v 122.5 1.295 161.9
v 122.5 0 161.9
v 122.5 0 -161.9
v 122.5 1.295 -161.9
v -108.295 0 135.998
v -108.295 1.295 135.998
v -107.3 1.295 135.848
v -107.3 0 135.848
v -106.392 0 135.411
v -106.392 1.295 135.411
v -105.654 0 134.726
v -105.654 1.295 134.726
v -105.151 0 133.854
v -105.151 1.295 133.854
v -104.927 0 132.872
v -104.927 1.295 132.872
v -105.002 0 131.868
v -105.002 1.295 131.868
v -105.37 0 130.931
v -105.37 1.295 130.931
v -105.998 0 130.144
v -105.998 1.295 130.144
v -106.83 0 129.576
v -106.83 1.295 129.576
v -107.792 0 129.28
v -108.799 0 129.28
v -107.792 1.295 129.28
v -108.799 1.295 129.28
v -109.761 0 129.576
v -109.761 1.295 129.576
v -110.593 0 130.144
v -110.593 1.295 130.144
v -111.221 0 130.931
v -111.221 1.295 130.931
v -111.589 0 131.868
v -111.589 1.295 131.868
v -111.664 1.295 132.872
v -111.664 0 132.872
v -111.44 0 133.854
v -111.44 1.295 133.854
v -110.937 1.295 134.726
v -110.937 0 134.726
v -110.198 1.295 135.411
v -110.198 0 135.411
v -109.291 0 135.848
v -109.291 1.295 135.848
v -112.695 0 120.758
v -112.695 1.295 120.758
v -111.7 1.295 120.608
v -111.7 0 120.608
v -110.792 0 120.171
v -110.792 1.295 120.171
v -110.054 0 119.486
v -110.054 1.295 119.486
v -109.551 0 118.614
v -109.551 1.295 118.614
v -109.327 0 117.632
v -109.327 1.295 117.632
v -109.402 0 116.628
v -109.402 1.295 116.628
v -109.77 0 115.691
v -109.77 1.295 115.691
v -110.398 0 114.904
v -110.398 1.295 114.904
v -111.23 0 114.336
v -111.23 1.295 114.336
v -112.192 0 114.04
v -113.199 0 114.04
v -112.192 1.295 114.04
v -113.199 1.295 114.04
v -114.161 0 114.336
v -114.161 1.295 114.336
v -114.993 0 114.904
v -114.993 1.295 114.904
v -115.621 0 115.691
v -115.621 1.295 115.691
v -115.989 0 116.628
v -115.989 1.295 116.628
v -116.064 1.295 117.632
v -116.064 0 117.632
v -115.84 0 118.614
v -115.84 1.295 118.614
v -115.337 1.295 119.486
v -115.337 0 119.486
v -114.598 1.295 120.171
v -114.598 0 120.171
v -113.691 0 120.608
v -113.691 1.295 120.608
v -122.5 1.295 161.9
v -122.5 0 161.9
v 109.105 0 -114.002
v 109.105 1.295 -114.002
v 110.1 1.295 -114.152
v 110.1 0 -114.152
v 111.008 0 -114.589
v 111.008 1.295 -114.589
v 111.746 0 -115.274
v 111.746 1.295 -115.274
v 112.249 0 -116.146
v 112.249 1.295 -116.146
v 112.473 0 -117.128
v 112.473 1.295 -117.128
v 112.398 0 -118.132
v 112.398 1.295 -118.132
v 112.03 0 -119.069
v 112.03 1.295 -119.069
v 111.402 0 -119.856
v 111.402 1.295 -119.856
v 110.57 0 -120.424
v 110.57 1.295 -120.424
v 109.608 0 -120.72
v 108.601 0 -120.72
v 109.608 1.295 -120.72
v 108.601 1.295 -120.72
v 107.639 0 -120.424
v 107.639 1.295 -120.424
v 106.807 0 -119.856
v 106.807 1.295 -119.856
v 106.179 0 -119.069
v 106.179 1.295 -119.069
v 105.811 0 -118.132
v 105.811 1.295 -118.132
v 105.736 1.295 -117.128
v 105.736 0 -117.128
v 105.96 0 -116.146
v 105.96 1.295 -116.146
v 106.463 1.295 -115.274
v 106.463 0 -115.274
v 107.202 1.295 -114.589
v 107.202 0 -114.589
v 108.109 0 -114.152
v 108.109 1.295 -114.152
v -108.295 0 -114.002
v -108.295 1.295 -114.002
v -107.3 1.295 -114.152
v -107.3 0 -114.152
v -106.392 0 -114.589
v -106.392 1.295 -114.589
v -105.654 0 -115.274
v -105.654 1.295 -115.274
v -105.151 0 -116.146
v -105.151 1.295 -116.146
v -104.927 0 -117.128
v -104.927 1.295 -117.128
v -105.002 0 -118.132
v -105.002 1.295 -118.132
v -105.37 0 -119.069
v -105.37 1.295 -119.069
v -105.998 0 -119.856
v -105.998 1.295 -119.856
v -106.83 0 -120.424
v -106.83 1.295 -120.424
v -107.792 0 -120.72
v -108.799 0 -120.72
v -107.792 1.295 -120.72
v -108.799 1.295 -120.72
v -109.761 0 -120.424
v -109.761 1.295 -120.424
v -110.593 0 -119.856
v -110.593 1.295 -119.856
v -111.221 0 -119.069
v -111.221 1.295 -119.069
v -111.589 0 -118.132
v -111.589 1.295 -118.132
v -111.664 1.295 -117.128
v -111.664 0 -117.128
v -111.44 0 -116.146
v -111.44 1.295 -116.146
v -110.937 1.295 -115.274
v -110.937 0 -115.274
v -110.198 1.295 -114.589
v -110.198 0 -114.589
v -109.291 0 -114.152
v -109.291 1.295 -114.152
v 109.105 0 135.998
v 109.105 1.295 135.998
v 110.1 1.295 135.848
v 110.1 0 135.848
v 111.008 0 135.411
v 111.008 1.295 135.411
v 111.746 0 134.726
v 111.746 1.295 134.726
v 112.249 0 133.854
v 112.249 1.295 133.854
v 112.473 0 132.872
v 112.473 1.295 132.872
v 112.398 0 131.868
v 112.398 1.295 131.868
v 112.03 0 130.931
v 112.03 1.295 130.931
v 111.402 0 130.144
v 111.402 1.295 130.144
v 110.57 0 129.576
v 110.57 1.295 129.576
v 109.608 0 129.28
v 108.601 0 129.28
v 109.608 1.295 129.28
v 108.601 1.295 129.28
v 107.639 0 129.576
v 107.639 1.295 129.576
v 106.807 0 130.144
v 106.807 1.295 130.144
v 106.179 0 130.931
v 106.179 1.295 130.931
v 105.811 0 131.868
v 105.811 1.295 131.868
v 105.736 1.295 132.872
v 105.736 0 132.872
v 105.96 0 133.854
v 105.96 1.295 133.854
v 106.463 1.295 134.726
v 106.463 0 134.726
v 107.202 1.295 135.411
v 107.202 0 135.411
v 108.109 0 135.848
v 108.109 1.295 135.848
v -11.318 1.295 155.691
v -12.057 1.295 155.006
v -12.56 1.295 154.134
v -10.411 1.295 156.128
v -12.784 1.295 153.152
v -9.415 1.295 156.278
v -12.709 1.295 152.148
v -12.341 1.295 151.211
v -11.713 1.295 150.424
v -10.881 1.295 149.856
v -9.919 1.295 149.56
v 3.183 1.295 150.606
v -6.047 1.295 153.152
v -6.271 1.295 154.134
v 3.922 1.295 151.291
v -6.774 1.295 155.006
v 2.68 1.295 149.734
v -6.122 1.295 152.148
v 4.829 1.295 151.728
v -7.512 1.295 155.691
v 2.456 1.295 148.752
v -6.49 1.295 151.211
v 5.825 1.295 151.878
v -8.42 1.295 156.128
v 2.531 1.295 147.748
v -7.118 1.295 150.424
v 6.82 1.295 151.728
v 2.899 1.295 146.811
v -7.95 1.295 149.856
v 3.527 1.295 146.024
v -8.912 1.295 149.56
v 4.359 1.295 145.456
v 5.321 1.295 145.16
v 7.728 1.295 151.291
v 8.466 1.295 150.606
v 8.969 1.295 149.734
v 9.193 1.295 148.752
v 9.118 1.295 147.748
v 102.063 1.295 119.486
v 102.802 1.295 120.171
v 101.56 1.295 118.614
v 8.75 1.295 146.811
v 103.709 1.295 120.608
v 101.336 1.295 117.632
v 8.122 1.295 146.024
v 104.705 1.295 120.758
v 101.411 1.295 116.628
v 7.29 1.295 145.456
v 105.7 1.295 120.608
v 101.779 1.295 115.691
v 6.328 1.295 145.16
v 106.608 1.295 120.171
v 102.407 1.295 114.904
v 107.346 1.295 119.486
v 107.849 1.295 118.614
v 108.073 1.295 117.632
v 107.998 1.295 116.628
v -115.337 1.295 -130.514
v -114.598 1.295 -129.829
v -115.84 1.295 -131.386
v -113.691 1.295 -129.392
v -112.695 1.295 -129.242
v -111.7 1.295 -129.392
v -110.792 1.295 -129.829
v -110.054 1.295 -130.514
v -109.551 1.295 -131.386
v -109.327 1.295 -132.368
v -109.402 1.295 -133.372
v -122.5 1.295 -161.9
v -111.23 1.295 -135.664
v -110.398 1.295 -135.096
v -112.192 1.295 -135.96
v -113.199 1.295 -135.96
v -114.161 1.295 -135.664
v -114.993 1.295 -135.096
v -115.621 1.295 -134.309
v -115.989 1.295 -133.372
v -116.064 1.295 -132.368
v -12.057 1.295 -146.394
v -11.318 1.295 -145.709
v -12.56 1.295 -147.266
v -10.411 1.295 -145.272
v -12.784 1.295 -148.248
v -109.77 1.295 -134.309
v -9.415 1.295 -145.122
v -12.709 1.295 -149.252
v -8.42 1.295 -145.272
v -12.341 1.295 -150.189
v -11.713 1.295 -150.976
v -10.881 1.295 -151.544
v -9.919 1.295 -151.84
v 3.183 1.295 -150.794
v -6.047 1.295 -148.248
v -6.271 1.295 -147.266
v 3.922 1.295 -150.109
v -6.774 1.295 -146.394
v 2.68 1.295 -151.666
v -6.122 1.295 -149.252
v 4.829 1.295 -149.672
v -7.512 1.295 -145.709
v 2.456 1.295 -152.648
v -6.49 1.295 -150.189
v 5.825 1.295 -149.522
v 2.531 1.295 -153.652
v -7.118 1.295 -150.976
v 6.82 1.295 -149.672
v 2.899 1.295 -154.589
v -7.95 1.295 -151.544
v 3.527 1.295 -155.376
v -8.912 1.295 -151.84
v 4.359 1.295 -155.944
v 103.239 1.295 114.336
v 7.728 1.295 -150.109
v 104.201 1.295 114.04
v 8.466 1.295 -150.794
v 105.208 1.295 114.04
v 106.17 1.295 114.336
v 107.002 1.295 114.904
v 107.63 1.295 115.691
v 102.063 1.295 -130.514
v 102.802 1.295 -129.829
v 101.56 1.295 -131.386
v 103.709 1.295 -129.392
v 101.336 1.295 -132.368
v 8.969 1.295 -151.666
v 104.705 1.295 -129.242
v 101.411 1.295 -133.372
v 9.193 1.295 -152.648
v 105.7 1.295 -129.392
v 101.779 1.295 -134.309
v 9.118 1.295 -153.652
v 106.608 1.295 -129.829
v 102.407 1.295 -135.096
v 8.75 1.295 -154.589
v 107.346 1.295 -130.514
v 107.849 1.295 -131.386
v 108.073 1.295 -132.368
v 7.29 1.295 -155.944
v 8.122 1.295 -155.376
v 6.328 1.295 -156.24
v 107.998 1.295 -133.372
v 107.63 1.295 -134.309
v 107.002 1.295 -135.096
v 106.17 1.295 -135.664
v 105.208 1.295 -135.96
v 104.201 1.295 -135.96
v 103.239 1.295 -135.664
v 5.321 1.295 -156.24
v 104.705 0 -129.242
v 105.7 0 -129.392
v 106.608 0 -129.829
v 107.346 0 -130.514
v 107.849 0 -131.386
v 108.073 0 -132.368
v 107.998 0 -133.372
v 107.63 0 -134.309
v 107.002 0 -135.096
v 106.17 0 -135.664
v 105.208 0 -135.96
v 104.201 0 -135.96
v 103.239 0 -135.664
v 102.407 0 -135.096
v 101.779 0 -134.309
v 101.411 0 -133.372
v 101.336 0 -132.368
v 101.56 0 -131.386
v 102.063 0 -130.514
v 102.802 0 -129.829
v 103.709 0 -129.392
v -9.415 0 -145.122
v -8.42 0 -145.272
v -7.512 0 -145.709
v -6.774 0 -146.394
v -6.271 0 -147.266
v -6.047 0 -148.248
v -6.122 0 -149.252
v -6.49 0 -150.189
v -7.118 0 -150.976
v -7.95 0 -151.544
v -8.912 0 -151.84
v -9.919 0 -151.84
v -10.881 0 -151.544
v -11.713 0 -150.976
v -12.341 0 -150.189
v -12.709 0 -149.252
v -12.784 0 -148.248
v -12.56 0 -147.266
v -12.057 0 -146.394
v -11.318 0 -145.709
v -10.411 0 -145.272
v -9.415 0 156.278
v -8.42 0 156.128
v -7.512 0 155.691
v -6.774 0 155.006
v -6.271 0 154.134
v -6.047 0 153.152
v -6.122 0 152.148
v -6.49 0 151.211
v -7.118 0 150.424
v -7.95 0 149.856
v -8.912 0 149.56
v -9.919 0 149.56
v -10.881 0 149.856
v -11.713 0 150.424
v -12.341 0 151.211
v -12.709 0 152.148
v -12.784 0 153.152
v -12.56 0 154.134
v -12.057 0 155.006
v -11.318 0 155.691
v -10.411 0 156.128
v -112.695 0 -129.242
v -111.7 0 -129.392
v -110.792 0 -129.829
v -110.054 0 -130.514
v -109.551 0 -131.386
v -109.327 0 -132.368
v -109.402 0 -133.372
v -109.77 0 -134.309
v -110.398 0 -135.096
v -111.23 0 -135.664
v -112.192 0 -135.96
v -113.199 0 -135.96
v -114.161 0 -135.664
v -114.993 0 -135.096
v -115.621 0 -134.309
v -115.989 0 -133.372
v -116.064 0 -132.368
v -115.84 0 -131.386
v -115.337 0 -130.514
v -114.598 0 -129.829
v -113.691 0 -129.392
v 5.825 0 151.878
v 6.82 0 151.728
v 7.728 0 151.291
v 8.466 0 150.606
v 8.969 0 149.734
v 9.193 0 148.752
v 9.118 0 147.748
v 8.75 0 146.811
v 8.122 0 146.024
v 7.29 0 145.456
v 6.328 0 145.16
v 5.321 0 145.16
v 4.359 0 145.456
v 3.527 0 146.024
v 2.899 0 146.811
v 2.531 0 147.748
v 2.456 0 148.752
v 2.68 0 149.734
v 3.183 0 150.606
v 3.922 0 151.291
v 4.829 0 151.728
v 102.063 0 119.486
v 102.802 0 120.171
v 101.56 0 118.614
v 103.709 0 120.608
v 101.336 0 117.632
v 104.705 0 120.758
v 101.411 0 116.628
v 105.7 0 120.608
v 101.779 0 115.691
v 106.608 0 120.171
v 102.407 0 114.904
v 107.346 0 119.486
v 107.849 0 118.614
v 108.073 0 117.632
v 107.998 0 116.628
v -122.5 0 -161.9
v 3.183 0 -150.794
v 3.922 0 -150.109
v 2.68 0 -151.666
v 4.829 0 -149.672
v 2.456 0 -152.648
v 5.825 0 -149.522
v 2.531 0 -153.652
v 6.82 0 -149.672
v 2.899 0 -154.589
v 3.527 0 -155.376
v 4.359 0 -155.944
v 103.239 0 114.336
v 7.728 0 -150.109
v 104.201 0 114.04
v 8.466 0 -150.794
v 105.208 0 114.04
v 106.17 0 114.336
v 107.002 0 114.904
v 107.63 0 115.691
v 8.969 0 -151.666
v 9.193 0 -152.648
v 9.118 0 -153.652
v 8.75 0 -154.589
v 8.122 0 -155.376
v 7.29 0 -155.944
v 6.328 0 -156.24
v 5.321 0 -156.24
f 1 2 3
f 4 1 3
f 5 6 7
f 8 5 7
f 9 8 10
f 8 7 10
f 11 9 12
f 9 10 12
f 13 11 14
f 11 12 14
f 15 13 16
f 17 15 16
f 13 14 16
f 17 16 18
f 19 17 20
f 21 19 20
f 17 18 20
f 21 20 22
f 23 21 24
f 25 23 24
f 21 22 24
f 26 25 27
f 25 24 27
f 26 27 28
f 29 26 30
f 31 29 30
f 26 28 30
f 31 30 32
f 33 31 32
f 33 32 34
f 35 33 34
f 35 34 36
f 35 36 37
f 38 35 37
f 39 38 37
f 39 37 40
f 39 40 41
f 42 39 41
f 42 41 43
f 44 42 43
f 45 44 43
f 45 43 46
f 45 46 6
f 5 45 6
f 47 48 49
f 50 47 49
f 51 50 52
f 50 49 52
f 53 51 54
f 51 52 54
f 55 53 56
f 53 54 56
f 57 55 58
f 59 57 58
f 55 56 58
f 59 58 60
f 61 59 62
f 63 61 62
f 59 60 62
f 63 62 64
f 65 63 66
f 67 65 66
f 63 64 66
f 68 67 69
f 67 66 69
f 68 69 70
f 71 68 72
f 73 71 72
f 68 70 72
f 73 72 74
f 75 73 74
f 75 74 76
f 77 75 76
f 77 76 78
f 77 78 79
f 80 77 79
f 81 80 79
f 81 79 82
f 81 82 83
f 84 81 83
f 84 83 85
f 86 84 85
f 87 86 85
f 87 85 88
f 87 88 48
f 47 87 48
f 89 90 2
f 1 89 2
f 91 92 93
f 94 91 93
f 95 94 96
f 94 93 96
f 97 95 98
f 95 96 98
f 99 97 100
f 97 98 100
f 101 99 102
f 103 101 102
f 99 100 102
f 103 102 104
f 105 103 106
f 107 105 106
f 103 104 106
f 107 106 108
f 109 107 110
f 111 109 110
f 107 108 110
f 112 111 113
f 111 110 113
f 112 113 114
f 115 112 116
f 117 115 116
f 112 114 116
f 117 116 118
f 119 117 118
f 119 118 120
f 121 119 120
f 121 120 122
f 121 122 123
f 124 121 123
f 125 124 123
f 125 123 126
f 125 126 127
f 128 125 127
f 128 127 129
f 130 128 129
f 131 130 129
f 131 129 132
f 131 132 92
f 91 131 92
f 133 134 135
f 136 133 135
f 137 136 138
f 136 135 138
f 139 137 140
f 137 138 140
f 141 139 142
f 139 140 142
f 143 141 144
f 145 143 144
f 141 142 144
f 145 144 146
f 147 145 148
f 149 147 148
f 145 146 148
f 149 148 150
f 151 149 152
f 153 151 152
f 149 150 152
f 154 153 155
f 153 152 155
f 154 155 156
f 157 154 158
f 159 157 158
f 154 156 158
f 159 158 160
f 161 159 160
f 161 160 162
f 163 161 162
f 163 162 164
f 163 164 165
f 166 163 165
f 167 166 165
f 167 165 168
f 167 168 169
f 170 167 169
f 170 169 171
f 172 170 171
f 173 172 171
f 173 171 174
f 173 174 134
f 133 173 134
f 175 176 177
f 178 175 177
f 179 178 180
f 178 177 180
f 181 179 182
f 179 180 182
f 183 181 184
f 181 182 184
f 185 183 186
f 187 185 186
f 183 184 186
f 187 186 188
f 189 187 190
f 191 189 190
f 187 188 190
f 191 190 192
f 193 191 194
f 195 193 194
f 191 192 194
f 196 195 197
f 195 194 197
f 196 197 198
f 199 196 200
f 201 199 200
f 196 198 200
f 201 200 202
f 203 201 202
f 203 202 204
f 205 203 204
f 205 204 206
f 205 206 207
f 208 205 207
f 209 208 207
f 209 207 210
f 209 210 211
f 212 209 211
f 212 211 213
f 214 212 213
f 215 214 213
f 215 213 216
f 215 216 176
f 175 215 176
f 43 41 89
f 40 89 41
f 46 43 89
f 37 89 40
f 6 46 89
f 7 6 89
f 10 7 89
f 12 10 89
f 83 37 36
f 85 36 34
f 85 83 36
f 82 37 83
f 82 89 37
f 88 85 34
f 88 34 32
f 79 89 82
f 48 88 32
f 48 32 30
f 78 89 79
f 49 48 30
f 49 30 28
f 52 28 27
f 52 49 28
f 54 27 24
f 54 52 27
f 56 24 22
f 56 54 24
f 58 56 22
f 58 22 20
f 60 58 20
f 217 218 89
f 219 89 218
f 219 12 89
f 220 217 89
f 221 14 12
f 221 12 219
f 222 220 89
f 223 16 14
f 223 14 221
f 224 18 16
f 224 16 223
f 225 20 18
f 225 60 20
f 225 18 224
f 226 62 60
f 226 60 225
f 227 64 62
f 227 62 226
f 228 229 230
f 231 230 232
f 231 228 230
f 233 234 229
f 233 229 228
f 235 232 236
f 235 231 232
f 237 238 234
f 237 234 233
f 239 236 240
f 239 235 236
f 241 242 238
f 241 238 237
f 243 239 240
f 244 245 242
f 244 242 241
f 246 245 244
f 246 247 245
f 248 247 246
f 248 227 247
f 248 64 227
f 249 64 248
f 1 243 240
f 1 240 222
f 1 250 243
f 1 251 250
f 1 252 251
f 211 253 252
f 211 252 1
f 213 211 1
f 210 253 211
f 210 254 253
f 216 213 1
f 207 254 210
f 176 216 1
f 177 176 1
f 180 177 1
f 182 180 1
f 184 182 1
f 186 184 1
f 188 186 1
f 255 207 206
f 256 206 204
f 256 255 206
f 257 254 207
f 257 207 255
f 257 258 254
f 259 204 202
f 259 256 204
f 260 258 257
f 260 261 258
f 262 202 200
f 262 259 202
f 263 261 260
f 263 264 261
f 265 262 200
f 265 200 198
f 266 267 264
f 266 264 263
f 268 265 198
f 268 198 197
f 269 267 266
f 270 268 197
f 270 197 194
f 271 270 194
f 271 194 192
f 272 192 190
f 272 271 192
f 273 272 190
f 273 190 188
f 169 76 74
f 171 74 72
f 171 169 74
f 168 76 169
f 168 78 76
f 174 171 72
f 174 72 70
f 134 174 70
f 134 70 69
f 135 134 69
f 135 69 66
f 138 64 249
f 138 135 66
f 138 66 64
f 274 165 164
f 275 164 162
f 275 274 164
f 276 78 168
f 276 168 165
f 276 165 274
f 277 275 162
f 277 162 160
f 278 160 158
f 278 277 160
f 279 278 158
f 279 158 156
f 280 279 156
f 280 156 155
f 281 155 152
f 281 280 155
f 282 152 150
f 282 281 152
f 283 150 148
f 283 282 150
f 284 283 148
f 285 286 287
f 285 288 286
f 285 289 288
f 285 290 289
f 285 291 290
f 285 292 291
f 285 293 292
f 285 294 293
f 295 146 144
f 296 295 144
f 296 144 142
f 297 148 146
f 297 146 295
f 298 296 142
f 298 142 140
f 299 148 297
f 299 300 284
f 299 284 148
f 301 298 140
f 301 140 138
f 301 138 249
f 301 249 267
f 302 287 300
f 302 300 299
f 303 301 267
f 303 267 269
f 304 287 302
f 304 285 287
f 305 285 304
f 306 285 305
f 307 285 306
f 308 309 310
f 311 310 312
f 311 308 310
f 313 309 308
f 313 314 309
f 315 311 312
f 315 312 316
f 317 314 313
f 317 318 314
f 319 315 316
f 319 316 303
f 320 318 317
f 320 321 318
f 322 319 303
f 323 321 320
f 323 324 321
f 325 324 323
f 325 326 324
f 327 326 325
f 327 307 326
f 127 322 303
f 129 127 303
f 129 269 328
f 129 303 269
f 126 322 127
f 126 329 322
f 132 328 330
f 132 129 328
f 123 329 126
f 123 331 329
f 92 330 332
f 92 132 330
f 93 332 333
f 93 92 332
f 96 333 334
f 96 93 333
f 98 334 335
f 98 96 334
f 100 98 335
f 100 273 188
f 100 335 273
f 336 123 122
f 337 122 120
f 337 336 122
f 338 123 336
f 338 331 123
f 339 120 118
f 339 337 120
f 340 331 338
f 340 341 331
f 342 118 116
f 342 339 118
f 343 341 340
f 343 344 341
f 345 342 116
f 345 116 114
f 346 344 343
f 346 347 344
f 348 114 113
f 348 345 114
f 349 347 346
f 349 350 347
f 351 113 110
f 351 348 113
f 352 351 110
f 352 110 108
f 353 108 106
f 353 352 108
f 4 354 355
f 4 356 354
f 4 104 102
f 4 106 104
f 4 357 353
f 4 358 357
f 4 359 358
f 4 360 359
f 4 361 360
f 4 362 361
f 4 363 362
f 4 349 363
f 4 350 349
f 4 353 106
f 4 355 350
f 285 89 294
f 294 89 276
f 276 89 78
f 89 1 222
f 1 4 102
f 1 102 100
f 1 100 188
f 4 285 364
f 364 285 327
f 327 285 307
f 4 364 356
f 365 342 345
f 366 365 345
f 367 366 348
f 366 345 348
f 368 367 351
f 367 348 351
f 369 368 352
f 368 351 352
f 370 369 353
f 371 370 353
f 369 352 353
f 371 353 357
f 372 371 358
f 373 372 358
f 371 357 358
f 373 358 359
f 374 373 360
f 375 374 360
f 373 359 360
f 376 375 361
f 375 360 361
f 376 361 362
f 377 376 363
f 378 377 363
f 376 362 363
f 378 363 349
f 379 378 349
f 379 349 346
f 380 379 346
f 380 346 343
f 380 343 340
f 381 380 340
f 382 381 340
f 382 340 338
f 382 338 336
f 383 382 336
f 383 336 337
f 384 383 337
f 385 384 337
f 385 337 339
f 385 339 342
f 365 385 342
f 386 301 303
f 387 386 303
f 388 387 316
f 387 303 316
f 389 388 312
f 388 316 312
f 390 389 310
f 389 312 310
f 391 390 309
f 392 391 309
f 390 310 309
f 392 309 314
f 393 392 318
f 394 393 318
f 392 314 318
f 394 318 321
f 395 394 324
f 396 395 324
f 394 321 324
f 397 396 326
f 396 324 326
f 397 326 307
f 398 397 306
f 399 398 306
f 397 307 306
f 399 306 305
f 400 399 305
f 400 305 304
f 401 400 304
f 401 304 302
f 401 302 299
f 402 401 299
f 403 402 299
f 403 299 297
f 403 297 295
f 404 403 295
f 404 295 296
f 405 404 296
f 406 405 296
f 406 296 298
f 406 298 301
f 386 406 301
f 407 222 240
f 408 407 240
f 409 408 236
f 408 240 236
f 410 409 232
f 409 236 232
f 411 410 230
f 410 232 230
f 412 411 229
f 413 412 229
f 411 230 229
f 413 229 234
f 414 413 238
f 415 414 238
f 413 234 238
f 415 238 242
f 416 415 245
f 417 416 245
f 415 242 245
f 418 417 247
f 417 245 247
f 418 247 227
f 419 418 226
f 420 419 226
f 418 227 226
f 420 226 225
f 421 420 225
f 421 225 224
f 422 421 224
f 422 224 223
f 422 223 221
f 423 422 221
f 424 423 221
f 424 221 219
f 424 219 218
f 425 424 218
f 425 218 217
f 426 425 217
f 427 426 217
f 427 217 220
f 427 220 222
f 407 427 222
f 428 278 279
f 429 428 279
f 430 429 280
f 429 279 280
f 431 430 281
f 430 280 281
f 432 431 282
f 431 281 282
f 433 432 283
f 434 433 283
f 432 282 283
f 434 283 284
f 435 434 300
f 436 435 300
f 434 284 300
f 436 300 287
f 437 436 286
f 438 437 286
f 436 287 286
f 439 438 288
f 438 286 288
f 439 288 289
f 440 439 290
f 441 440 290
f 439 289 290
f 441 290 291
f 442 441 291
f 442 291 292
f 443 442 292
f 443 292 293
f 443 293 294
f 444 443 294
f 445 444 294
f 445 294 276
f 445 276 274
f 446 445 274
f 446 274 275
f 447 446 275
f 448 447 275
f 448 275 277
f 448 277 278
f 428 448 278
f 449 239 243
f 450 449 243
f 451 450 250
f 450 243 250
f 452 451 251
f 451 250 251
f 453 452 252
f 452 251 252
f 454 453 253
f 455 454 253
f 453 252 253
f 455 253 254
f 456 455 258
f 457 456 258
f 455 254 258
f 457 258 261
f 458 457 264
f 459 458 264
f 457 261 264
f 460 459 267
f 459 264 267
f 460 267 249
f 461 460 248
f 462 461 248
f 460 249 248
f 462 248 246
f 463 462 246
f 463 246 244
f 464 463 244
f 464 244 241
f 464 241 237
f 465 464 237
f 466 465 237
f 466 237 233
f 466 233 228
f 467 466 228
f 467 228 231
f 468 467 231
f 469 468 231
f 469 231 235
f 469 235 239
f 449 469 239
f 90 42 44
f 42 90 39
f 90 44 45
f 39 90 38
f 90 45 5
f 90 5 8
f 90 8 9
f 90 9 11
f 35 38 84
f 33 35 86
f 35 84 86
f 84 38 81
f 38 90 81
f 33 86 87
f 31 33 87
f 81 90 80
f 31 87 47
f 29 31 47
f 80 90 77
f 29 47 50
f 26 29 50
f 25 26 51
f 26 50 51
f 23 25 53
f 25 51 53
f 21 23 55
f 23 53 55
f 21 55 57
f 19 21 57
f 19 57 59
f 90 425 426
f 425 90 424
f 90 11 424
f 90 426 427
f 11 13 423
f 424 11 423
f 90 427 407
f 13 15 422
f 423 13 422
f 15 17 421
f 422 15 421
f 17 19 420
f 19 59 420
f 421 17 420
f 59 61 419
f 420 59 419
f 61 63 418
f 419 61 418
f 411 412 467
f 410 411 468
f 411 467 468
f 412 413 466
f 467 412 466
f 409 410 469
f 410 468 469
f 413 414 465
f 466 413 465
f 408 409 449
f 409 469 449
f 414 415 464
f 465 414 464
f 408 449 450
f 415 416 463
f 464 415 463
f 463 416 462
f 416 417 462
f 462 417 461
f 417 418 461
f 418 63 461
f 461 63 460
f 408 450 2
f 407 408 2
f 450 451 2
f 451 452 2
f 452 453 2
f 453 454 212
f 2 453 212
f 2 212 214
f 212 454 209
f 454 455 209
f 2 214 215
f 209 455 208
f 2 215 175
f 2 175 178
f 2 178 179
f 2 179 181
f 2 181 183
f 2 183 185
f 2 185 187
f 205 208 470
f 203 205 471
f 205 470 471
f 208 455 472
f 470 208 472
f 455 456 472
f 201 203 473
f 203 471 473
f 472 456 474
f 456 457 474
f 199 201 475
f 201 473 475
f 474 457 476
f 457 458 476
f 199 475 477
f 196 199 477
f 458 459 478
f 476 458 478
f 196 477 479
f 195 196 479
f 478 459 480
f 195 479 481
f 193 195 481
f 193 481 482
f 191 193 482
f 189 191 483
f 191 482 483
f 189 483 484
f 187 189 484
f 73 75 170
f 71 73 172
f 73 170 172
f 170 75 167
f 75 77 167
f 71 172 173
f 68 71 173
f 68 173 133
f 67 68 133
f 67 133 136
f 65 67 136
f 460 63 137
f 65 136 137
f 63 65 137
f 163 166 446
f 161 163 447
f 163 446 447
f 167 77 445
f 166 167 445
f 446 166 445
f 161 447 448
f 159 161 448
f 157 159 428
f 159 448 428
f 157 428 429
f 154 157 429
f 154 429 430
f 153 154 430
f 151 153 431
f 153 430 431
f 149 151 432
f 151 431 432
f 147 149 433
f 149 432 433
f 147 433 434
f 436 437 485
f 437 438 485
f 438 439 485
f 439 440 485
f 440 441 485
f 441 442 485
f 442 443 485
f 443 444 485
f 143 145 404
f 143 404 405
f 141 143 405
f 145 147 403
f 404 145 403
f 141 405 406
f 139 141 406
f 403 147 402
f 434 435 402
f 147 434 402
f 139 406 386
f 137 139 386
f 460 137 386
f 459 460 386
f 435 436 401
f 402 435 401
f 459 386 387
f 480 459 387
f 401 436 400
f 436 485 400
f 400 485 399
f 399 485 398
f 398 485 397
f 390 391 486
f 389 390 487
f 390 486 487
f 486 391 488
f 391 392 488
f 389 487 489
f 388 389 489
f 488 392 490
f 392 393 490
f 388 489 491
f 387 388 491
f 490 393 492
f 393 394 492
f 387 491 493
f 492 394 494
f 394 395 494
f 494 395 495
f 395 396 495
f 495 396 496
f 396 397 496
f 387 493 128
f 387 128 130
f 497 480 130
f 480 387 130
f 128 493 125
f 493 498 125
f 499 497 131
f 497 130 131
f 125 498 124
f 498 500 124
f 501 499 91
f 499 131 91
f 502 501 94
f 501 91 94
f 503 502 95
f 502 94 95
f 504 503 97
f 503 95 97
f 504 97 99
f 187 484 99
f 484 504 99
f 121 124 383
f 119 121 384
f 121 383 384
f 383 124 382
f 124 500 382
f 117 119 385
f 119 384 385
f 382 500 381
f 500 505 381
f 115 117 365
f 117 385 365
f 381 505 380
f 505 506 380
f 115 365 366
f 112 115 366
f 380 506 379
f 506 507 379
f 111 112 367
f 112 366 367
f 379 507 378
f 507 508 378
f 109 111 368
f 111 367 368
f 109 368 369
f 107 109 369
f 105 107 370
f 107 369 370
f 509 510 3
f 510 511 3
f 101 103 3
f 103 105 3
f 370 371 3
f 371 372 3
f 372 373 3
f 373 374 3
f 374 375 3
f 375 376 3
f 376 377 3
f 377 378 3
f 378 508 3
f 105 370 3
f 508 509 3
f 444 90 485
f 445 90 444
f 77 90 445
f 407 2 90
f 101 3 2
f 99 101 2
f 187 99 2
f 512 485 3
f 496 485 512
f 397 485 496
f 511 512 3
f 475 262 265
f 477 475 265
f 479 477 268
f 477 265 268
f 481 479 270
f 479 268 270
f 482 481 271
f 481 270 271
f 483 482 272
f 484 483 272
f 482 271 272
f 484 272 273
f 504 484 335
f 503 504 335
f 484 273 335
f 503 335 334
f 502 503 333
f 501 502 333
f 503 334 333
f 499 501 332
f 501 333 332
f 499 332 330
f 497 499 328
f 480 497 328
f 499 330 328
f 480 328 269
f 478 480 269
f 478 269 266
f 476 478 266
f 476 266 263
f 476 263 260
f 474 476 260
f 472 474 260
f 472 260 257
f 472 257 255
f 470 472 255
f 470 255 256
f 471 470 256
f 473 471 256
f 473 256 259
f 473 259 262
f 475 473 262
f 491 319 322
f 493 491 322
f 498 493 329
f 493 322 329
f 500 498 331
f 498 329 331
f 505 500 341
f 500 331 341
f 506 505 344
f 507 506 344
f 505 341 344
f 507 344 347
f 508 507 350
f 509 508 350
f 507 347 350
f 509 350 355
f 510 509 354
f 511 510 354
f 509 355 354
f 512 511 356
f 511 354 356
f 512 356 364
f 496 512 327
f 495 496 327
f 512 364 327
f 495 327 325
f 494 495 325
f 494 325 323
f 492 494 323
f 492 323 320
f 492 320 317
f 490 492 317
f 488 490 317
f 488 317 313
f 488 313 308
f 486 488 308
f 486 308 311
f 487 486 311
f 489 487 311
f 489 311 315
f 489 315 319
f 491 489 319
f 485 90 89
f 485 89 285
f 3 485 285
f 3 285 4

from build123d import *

# Parameters (mm, degrees)
SKETCH3_W           = 245
SKETCH3_H           = 323.8
BOSS_EXTRUDE1_DEPTH = 1.2954
CUT_EXTRUDE1_REACH  = 205.026
SKETCH4_R           = 3.3782


with BuildPart() as part:
    # Sketch3 → Boss-Extrude1 (new body)
    with BuildSketch(Plane(origin=(0, 0, 0), x_dir=(1, 0, 0), z_dir=(0, 1, 0))):
        Rectangle(SKETCH3_W, SKETCH3_H)
    extrude(amount=BOSS_EXTRUDE1_DEPTH)

    # Sketch4 → Cut-Extrude1 (cut, up to next)
    with BuildSketch(Plane(origin=(0, 1.2954, 0), x_dir=(1, 0, 0), z_dir=(0, 1, 0)), mode=Mode.PRIVATE) as cut_extrude1_sk1:
        with Locations(Location((109.1046, -132.62, 0), (0, 0, 270))):
            Circle(SKETCH4_R)
    cut_extrude1_tool1 = extrude(cut_extrude1_sk1.sketch, amount=-CUT_EXTRUDE1_REACH, mode=Mode.PRIVATE) & part.part
    # Sketch4 → Cut-Extrude1 (cut, up to next)
    with BuildSketch(Plane(origin=(0, 1.2954, 0), x_dir=(1, 0, 0), z_dir=(0, 1, 0)), mode=Mode.PRIVATE) as cut_extrude1_sk2:
        with Locations(Location((104.7046, -117.38, 0), (0, 0, 270))):
            Circle(SKETCH4_R)
    cut_extrude1_tool2 = extrude(cut_extrude1_sk2.sketch, amount=-CUT_EXTRUDE1_REACH, mode=Mode.PRIVATE) & part.part
    # Sketch4 → Cut-Extrude1 (cut, up to next)
    with BuildSketch(Plane(origin=(0, 1.2954, 0), x_dir=(1, 0, 0), z_dir=(0, 1, 0)), mode=Mode.PRIVATE) as cut_extrude1_sk3:
        with Locations(Location((5.8246, -148.5, 0), (0, 0, 270))):
            Circle(SKETCH4_R)
    cut_extrude1_tool3 = extrude(cut_extrude1_sk3.sketch, amount=-CUT_EXTRUDE1_REACH, mode=Mode.PRIVATE) & part.part
    # Sketch4 → Cut-Extrude1 (cut, up to next)
    with BuildSketch(Plane(origin=(0, 1.2954, 0), x_dir=(1, 0, 0), z_dir=(0, 1, 0)), mode=Mode.PRIVATE) as cut_extrude1_sk4:
        with Locations(Location((-9.4154, -152.9, 0), (0, 0, 270))):
            Circle(SKETCH4_R)
    cut_extrude1_tool4 = extrude(cut_extrude1_sk4.sketch, amount=-CUT_EXTRUDE1_REACH, mode=Mode.PRIVATE) & part.part
    # Sketch4 → Cut-Extrude1 (cut, up to next)
    with BuildSketch(Plane(origin=(0, 1.2954, 0), x_dir=(1, 0, 0), z_dir=(0, 1, 0)), mode=Mode.PRIVATE) as cut_extrude1_sk5:
        with Locations(Location((109.1046, 117.38, 0), (0, 0, 270))):
            Circle(SKETCH4_R)
    cut_extrude1_tool5 = extrude(cut_extrude1_sk5.sketch, amount=-CUT_EXTRUDE1_REACH, mode=Mode.PRIVATE) & part.part
    # Sketch4 → Cut-Extrude1 (cut, up to next)
    with BuildSketch(Plane(origin=(0, 1.2954, 0), x_dir=(1, 0, 0), z_dir=(0, 1, 0)), mode=Mode.PRIVATE) as cut_extrude1_sk6:
        with Locations(Location((104.7046, 132.62, 0), (0, 0, 270))):
            Circle(SKETCH4_R)
    cut_extrude1_tool6 = extrude(cut_extrude1_sk6.sketch, amount=-CUT_EXTRUDE1_REACH, mode=Mode.PRIVATE) & part.part
    # Sketch4 → Cut-Extrude1 (cut, up to next)
    with BuildSketch(Plane(origin=(0, 1.2954, 0), x_dir=(1, 0, 0), z_dir=(0, 1, 0)), mode=Mode.PRIVATE) as cut_extrude1_sk7:
        with Locations(Location((5.8246, 152.9, 0), (0, 0, 270))):
            Circle(SKETCH4_R)
    cut_extrude1_tool7 = extrude(cut_extrude1_sk7.sketch, amount=-CUT_EXTRUDE1_REACH, mode=Mode.PRIVATE) & part.part
    # Sketch4 → Cut-Extrude1 (cut, up to next)
    with BuildSketch(Plane(origin=(0, 1.2954, 0), x_dir=(1, 0, 0), z_dir=(0, 1, 0)), mode=Mode.PRIVATE) as cut_extrude1_sk8:
        with Locations(Location((-9.4154, 148.5, 0), (0, 0, 270))):
            Circle(SKETCH4_R)
    cut_extrude1_tool8 = extrude(cut_extrude1_sk8.sketch, amount=-CUT_EXTRUDE1_REACH, mode=Mode.PRIVATE) & part.part
    # Sketch4 → Cut-Extrude1 (cut, up to next)
    with BuildSketch(Plane(origin=(0, 1.2954, 0), x_dir=(1, 0, 0), z_dir=(0, 1, 0)), mode=Mode.PRIVATE) as cut_extrude1_sk9:
        with Locations(Location((-108.2954, 117.38, 0), (0, 0, 270))):
            Circle(SKETCH4_R)
    cut_extrude1_tool9 = extrude(cut_extrude1_sk9.sketch, amount=-CUT_EXTRUDE1_REACH, mode=Mode.PRIVATE) & part.part
    # Sketch4 → Cut-Extrude1 (cut, up to next)
    with BuildSketch(Plane(origin=(0, 1.2954, 0), x_dir=(1, 0, 0), z_dir=(0, 1, 0)), mode=Mode.PRIVATE) as cut_extrude1_sk10:
        with Locations(Location((-112.6954, 132.62, 0), (0, 0, 270))):
            Circle(SKETCH4_R)
    cut_extrude1_tool10 = extrude(cut_extrude1_sk10.sketch, amount=-CUT_EXTRUDE1_REACH, mode=Mode.PRIVATE) & part.part
    # Sketch4 → Cut-Extrude1 (cut, up to next)
    with BuildSketch(Plane(origin=(0, 1.2954, 0), x_dir=(1, 0, 0), z_dir=(0, 1, 0)), mode=Mode.PRIVATE) as cut_extrude1_sk11:
        with Locations(Location((-108.2954, -132.62, 0), (0, 0, 270))):
            Circle(SKETCH4_R)
    cut_extrude1_tool11 = extrude(cut_extrude1_sk11.sketch, amount=-CUT_EXTRUDE1_REACH, mode=Mode.PRIVATE) & part.part
    # Sketch4 → Cut-Extrude1 (cut, up to next)
    with BuildSketch(Plane(origin=(0, 1.2954, 0), x_dir=(1, 0, 0), z_dir=(0, 1, 0)), mode=Mode.PRIVATE) as cut_extrude1_sk12:
        with Locations(Location((-112.6954, -117.38, 0), (0, 0, 270))):
            Circle(SKETCH4_R)
    cut_extrude1_tool12 = extrude(cut_extrude1_sk12.sketch, amount=-CUT_EXTRUDE1_REACH, mode=Mode.PRIVATE) & part.part
    add(cut_extrude1_tool1.solids().sort_by_distance((109.1046, 1.2954, 132.62))[0], mode=Mode.SUBTRACT)
    add(cut_extrude1_tool2.solids().sort_by_distance((104.7046, 1.2954, 117.38))[0], mode=Mode.SUBTRACT)
    add(cut_extrude1_tool3.solids().sort_by_distance((5.8246, 1.2954, 148.5))[0], mode=Mode.SUBTRACT)
    add(cut_extrude1_tool4.solids().sort_by_distance((-9.4154, 1.2954, 152.9))[0], mode=Mode.SUBTRACT)
    add(cut_extrude1_tool5.solids().sort_by_distance((109.1046, 1.2954, -117.38))[0], mode=Mode.SUBTRACT)
    add(cut_extrude1_tool6.solids().sort_by_distance((104.7046, 1.2954, -132.62))[0], mode=Mode.SUBTRACT)
    add(cut_extrude1_tool7.solids().sort_by_distance((5.8246, 1.2954, -152.9))[0], mode=Mode.SUBTRACT)
    add(cut_extrude1_tool8.solids().sort_by_distance((-9.4154, 1.2954, -148.5))[0], mode=Mode.SUBTRACT)
    add(cut_extrude1_tool9.solids().sort_by_distance((-108.2954, 1.2954, -117.38))[0], mode=Mode.SUBTRACT)
    add(cut_extrude1_tool10.solids().sort_by_distance((-112.6954, 1.2954, -132.62))[0], mode=Mode.SUBTRACT)
    add(cut_extrude1_tool11.solids().sort_by_distance((-108.2954, 1.2954, 132.62))[0], mode=Mode.SUBTRACT)
    add(cut_extrude1_tool12.solids().sort_by_distance((-112.6954, 1.2954, 117.38))[0], mode=Mode.SUBTRACT)


solid = part.part
